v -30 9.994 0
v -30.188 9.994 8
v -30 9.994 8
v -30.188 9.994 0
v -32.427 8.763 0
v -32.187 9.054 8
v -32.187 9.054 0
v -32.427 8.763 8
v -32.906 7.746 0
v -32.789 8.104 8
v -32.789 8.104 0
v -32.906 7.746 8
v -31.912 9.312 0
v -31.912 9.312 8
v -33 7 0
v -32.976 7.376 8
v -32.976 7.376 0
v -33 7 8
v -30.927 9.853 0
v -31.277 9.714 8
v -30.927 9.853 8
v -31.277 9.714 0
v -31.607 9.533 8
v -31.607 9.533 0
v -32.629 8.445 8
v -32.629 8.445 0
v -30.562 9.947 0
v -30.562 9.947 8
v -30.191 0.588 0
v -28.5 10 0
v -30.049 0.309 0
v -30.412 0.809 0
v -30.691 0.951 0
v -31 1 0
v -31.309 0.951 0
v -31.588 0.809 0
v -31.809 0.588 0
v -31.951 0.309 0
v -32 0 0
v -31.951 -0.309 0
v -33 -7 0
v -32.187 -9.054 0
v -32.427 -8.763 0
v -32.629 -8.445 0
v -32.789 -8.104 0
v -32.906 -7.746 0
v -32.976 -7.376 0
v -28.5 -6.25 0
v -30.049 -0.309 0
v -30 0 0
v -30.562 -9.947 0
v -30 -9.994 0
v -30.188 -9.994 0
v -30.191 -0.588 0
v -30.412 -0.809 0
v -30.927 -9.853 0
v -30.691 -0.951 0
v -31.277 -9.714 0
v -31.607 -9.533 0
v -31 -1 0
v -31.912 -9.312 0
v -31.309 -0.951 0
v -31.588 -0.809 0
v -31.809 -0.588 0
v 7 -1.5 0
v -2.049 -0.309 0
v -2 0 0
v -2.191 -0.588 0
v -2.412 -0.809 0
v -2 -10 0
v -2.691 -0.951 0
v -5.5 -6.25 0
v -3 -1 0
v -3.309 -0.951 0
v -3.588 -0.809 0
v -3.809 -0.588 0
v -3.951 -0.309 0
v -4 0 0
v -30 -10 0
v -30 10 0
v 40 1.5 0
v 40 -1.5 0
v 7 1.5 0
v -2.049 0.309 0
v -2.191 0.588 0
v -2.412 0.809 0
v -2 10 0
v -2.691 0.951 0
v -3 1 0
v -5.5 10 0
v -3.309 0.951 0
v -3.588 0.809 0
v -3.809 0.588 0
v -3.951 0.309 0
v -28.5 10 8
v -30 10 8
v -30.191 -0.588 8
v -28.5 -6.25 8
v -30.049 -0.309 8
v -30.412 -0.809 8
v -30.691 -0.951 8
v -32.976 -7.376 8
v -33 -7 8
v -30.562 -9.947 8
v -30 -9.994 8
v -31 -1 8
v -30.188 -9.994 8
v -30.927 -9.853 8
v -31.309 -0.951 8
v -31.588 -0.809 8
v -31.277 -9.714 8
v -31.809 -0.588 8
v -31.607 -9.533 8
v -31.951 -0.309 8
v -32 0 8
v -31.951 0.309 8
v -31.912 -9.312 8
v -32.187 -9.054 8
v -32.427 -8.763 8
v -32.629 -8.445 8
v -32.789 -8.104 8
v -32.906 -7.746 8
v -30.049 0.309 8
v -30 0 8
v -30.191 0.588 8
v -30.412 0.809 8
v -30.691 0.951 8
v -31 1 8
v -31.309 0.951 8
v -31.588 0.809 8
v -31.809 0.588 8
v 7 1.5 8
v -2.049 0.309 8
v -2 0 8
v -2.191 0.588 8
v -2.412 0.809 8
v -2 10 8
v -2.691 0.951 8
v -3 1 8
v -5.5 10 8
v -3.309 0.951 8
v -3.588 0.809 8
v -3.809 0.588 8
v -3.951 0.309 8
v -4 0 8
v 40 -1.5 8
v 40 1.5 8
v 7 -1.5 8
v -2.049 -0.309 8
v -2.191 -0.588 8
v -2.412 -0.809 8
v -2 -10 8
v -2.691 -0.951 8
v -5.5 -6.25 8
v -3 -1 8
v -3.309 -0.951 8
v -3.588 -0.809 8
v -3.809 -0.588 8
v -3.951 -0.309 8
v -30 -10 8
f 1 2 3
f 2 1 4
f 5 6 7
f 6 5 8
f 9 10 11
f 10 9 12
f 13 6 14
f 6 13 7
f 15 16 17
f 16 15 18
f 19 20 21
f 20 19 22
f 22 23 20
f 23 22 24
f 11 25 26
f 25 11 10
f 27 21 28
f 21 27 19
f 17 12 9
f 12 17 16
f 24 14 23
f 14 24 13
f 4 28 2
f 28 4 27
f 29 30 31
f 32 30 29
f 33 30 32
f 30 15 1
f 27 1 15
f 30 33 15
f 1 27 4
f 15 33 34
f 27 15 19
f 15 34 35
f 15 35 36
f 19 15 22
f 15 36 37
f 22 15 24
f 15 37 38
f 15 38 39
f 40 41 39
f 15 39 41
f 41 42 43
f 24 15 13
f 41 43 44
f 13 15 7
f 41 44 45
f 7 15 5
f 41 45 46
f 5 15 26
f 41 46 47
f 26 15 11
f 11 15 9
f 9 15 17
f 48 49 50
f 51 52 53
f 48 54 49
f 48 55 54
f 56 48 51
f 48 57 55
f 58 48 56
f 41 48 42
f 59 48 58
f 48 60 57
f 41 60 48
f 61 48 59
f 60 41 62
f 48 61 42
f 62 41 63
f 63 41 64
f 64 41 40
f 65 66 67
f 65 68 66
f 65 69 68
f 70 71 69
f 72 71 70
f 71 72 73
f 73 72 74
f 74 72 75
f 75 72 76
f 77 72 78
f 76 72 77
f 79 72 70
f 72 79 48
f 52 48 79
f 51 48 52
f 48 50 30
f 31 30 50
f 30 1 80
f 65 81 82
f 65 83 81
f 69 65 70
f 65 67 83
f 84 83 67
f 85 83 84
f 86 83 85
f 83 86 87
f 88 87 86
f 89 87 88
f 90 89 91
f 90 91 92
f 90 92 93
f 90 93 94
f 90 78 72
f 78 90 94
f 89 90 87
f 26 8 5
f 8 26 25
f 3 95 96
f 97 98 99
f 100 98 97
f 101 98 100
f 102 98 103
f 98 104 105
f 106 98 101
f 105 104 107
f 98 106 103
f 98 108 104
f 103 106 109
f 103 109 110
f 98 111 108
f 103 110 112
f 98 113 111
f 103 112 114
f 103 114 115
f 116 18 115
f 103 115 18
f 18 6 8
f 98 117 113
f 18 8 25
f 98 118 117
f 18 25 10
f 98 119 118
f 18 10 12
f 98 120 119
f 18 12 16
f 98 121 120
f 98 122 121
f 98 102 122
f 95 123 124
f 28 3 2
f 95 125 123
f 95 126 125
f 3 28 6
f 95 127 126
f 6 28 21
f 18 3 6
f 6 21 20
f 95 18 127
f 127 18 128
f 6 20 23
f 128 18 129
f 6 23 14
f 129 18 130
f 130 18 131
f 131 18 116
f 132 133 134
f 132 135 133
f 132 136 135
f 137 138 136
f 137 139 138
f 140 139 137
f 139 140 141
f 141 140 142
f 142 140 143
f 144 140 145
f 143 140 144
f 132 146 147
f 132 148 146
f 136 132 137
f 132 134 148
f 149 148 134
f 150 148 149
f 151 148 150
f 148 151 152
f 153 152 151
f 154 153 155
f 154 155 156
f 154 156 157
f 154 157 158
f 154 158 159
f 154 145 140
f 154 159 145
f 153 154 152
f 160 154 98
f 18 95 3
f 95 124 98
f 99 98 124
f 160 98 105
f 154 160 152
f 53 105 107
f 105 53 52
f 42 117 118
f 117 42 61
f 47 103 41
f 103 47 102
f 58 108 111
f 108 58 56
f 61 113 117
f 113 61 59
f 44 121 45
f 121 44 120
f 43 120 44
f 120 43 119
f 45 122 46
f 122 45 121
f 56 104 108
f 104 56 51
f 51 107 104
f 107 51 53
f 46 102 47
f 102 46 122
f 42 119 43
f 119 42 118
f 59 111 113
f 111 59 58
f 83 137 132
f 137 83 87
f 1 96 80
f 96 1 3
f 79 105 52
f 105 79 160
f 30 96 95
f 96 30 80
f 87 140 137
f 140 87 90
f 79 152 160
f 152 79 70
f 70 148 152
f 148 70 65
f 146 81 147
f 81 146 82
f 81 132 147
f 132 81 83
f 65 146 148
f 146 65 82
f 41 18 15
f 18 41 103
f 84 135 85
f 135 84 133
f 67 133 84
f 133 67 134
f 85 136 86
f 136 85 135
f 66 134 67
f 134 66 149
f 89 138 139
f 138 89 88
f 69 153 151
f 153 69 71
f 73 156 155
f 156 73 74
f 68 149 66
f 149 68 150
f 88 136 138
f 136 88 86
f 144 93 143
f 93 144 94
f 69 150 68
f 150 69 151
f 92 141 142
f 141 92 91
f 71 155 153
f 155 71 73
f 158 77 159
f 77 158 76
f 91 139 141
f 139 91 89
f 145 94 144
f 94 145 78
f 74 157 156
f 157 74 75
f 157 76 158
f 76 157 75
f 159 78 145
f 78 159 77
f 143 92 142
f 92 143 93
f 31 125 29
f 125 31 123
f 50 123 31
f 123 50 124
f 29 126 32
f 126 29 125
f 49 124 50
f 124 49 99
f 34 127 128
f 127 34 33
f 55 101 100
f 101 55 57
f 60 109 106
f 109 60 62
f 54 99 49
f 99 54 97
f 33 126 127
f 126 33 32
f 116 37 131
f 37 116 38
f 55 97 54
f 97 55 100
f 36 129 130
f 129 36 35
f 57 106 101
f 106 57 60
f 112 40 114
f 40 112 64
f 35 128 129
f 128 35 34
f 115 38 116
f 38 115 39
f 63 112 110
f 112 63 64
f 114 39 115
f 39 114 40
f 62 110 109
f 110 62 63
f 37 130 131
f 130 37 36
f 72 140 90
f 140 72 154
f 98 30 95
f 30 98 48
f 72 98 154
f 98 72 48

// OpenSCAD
leg(23,12.5);

module leg(sl,sw){
	height=8;
	difference(){
		//solid parts
		union(){
			hull(){
				//main inner square
				translate([-30,-10,0]) cube([28,20,height]);
				//lower taper
				translate([5,-1.5,0]) cube([2,3,height]);
			}
	
			//leg
			translate([0,-1.5,0]) cube([40,3,height]);
			//top bar
			translate([-33,-7,0]) cube([6,14,height]);
			//rounded corners
			for (i = [ [-30,7,0],[-30,-7,0] ]){
				translate(i) cylinder(r=3,h=height,$fn=50);
			}	
		}
		//servo mounts
		for (i = [ [-3,0,-2],[-31,0,-2] ]){
			translate(i) cylinder(r=1,h=20,$fn=20);
		}
		//hole for servo body
		translate([-17,2.5,2])  cube([sl,sw+5,22], center=true);
	}
}
